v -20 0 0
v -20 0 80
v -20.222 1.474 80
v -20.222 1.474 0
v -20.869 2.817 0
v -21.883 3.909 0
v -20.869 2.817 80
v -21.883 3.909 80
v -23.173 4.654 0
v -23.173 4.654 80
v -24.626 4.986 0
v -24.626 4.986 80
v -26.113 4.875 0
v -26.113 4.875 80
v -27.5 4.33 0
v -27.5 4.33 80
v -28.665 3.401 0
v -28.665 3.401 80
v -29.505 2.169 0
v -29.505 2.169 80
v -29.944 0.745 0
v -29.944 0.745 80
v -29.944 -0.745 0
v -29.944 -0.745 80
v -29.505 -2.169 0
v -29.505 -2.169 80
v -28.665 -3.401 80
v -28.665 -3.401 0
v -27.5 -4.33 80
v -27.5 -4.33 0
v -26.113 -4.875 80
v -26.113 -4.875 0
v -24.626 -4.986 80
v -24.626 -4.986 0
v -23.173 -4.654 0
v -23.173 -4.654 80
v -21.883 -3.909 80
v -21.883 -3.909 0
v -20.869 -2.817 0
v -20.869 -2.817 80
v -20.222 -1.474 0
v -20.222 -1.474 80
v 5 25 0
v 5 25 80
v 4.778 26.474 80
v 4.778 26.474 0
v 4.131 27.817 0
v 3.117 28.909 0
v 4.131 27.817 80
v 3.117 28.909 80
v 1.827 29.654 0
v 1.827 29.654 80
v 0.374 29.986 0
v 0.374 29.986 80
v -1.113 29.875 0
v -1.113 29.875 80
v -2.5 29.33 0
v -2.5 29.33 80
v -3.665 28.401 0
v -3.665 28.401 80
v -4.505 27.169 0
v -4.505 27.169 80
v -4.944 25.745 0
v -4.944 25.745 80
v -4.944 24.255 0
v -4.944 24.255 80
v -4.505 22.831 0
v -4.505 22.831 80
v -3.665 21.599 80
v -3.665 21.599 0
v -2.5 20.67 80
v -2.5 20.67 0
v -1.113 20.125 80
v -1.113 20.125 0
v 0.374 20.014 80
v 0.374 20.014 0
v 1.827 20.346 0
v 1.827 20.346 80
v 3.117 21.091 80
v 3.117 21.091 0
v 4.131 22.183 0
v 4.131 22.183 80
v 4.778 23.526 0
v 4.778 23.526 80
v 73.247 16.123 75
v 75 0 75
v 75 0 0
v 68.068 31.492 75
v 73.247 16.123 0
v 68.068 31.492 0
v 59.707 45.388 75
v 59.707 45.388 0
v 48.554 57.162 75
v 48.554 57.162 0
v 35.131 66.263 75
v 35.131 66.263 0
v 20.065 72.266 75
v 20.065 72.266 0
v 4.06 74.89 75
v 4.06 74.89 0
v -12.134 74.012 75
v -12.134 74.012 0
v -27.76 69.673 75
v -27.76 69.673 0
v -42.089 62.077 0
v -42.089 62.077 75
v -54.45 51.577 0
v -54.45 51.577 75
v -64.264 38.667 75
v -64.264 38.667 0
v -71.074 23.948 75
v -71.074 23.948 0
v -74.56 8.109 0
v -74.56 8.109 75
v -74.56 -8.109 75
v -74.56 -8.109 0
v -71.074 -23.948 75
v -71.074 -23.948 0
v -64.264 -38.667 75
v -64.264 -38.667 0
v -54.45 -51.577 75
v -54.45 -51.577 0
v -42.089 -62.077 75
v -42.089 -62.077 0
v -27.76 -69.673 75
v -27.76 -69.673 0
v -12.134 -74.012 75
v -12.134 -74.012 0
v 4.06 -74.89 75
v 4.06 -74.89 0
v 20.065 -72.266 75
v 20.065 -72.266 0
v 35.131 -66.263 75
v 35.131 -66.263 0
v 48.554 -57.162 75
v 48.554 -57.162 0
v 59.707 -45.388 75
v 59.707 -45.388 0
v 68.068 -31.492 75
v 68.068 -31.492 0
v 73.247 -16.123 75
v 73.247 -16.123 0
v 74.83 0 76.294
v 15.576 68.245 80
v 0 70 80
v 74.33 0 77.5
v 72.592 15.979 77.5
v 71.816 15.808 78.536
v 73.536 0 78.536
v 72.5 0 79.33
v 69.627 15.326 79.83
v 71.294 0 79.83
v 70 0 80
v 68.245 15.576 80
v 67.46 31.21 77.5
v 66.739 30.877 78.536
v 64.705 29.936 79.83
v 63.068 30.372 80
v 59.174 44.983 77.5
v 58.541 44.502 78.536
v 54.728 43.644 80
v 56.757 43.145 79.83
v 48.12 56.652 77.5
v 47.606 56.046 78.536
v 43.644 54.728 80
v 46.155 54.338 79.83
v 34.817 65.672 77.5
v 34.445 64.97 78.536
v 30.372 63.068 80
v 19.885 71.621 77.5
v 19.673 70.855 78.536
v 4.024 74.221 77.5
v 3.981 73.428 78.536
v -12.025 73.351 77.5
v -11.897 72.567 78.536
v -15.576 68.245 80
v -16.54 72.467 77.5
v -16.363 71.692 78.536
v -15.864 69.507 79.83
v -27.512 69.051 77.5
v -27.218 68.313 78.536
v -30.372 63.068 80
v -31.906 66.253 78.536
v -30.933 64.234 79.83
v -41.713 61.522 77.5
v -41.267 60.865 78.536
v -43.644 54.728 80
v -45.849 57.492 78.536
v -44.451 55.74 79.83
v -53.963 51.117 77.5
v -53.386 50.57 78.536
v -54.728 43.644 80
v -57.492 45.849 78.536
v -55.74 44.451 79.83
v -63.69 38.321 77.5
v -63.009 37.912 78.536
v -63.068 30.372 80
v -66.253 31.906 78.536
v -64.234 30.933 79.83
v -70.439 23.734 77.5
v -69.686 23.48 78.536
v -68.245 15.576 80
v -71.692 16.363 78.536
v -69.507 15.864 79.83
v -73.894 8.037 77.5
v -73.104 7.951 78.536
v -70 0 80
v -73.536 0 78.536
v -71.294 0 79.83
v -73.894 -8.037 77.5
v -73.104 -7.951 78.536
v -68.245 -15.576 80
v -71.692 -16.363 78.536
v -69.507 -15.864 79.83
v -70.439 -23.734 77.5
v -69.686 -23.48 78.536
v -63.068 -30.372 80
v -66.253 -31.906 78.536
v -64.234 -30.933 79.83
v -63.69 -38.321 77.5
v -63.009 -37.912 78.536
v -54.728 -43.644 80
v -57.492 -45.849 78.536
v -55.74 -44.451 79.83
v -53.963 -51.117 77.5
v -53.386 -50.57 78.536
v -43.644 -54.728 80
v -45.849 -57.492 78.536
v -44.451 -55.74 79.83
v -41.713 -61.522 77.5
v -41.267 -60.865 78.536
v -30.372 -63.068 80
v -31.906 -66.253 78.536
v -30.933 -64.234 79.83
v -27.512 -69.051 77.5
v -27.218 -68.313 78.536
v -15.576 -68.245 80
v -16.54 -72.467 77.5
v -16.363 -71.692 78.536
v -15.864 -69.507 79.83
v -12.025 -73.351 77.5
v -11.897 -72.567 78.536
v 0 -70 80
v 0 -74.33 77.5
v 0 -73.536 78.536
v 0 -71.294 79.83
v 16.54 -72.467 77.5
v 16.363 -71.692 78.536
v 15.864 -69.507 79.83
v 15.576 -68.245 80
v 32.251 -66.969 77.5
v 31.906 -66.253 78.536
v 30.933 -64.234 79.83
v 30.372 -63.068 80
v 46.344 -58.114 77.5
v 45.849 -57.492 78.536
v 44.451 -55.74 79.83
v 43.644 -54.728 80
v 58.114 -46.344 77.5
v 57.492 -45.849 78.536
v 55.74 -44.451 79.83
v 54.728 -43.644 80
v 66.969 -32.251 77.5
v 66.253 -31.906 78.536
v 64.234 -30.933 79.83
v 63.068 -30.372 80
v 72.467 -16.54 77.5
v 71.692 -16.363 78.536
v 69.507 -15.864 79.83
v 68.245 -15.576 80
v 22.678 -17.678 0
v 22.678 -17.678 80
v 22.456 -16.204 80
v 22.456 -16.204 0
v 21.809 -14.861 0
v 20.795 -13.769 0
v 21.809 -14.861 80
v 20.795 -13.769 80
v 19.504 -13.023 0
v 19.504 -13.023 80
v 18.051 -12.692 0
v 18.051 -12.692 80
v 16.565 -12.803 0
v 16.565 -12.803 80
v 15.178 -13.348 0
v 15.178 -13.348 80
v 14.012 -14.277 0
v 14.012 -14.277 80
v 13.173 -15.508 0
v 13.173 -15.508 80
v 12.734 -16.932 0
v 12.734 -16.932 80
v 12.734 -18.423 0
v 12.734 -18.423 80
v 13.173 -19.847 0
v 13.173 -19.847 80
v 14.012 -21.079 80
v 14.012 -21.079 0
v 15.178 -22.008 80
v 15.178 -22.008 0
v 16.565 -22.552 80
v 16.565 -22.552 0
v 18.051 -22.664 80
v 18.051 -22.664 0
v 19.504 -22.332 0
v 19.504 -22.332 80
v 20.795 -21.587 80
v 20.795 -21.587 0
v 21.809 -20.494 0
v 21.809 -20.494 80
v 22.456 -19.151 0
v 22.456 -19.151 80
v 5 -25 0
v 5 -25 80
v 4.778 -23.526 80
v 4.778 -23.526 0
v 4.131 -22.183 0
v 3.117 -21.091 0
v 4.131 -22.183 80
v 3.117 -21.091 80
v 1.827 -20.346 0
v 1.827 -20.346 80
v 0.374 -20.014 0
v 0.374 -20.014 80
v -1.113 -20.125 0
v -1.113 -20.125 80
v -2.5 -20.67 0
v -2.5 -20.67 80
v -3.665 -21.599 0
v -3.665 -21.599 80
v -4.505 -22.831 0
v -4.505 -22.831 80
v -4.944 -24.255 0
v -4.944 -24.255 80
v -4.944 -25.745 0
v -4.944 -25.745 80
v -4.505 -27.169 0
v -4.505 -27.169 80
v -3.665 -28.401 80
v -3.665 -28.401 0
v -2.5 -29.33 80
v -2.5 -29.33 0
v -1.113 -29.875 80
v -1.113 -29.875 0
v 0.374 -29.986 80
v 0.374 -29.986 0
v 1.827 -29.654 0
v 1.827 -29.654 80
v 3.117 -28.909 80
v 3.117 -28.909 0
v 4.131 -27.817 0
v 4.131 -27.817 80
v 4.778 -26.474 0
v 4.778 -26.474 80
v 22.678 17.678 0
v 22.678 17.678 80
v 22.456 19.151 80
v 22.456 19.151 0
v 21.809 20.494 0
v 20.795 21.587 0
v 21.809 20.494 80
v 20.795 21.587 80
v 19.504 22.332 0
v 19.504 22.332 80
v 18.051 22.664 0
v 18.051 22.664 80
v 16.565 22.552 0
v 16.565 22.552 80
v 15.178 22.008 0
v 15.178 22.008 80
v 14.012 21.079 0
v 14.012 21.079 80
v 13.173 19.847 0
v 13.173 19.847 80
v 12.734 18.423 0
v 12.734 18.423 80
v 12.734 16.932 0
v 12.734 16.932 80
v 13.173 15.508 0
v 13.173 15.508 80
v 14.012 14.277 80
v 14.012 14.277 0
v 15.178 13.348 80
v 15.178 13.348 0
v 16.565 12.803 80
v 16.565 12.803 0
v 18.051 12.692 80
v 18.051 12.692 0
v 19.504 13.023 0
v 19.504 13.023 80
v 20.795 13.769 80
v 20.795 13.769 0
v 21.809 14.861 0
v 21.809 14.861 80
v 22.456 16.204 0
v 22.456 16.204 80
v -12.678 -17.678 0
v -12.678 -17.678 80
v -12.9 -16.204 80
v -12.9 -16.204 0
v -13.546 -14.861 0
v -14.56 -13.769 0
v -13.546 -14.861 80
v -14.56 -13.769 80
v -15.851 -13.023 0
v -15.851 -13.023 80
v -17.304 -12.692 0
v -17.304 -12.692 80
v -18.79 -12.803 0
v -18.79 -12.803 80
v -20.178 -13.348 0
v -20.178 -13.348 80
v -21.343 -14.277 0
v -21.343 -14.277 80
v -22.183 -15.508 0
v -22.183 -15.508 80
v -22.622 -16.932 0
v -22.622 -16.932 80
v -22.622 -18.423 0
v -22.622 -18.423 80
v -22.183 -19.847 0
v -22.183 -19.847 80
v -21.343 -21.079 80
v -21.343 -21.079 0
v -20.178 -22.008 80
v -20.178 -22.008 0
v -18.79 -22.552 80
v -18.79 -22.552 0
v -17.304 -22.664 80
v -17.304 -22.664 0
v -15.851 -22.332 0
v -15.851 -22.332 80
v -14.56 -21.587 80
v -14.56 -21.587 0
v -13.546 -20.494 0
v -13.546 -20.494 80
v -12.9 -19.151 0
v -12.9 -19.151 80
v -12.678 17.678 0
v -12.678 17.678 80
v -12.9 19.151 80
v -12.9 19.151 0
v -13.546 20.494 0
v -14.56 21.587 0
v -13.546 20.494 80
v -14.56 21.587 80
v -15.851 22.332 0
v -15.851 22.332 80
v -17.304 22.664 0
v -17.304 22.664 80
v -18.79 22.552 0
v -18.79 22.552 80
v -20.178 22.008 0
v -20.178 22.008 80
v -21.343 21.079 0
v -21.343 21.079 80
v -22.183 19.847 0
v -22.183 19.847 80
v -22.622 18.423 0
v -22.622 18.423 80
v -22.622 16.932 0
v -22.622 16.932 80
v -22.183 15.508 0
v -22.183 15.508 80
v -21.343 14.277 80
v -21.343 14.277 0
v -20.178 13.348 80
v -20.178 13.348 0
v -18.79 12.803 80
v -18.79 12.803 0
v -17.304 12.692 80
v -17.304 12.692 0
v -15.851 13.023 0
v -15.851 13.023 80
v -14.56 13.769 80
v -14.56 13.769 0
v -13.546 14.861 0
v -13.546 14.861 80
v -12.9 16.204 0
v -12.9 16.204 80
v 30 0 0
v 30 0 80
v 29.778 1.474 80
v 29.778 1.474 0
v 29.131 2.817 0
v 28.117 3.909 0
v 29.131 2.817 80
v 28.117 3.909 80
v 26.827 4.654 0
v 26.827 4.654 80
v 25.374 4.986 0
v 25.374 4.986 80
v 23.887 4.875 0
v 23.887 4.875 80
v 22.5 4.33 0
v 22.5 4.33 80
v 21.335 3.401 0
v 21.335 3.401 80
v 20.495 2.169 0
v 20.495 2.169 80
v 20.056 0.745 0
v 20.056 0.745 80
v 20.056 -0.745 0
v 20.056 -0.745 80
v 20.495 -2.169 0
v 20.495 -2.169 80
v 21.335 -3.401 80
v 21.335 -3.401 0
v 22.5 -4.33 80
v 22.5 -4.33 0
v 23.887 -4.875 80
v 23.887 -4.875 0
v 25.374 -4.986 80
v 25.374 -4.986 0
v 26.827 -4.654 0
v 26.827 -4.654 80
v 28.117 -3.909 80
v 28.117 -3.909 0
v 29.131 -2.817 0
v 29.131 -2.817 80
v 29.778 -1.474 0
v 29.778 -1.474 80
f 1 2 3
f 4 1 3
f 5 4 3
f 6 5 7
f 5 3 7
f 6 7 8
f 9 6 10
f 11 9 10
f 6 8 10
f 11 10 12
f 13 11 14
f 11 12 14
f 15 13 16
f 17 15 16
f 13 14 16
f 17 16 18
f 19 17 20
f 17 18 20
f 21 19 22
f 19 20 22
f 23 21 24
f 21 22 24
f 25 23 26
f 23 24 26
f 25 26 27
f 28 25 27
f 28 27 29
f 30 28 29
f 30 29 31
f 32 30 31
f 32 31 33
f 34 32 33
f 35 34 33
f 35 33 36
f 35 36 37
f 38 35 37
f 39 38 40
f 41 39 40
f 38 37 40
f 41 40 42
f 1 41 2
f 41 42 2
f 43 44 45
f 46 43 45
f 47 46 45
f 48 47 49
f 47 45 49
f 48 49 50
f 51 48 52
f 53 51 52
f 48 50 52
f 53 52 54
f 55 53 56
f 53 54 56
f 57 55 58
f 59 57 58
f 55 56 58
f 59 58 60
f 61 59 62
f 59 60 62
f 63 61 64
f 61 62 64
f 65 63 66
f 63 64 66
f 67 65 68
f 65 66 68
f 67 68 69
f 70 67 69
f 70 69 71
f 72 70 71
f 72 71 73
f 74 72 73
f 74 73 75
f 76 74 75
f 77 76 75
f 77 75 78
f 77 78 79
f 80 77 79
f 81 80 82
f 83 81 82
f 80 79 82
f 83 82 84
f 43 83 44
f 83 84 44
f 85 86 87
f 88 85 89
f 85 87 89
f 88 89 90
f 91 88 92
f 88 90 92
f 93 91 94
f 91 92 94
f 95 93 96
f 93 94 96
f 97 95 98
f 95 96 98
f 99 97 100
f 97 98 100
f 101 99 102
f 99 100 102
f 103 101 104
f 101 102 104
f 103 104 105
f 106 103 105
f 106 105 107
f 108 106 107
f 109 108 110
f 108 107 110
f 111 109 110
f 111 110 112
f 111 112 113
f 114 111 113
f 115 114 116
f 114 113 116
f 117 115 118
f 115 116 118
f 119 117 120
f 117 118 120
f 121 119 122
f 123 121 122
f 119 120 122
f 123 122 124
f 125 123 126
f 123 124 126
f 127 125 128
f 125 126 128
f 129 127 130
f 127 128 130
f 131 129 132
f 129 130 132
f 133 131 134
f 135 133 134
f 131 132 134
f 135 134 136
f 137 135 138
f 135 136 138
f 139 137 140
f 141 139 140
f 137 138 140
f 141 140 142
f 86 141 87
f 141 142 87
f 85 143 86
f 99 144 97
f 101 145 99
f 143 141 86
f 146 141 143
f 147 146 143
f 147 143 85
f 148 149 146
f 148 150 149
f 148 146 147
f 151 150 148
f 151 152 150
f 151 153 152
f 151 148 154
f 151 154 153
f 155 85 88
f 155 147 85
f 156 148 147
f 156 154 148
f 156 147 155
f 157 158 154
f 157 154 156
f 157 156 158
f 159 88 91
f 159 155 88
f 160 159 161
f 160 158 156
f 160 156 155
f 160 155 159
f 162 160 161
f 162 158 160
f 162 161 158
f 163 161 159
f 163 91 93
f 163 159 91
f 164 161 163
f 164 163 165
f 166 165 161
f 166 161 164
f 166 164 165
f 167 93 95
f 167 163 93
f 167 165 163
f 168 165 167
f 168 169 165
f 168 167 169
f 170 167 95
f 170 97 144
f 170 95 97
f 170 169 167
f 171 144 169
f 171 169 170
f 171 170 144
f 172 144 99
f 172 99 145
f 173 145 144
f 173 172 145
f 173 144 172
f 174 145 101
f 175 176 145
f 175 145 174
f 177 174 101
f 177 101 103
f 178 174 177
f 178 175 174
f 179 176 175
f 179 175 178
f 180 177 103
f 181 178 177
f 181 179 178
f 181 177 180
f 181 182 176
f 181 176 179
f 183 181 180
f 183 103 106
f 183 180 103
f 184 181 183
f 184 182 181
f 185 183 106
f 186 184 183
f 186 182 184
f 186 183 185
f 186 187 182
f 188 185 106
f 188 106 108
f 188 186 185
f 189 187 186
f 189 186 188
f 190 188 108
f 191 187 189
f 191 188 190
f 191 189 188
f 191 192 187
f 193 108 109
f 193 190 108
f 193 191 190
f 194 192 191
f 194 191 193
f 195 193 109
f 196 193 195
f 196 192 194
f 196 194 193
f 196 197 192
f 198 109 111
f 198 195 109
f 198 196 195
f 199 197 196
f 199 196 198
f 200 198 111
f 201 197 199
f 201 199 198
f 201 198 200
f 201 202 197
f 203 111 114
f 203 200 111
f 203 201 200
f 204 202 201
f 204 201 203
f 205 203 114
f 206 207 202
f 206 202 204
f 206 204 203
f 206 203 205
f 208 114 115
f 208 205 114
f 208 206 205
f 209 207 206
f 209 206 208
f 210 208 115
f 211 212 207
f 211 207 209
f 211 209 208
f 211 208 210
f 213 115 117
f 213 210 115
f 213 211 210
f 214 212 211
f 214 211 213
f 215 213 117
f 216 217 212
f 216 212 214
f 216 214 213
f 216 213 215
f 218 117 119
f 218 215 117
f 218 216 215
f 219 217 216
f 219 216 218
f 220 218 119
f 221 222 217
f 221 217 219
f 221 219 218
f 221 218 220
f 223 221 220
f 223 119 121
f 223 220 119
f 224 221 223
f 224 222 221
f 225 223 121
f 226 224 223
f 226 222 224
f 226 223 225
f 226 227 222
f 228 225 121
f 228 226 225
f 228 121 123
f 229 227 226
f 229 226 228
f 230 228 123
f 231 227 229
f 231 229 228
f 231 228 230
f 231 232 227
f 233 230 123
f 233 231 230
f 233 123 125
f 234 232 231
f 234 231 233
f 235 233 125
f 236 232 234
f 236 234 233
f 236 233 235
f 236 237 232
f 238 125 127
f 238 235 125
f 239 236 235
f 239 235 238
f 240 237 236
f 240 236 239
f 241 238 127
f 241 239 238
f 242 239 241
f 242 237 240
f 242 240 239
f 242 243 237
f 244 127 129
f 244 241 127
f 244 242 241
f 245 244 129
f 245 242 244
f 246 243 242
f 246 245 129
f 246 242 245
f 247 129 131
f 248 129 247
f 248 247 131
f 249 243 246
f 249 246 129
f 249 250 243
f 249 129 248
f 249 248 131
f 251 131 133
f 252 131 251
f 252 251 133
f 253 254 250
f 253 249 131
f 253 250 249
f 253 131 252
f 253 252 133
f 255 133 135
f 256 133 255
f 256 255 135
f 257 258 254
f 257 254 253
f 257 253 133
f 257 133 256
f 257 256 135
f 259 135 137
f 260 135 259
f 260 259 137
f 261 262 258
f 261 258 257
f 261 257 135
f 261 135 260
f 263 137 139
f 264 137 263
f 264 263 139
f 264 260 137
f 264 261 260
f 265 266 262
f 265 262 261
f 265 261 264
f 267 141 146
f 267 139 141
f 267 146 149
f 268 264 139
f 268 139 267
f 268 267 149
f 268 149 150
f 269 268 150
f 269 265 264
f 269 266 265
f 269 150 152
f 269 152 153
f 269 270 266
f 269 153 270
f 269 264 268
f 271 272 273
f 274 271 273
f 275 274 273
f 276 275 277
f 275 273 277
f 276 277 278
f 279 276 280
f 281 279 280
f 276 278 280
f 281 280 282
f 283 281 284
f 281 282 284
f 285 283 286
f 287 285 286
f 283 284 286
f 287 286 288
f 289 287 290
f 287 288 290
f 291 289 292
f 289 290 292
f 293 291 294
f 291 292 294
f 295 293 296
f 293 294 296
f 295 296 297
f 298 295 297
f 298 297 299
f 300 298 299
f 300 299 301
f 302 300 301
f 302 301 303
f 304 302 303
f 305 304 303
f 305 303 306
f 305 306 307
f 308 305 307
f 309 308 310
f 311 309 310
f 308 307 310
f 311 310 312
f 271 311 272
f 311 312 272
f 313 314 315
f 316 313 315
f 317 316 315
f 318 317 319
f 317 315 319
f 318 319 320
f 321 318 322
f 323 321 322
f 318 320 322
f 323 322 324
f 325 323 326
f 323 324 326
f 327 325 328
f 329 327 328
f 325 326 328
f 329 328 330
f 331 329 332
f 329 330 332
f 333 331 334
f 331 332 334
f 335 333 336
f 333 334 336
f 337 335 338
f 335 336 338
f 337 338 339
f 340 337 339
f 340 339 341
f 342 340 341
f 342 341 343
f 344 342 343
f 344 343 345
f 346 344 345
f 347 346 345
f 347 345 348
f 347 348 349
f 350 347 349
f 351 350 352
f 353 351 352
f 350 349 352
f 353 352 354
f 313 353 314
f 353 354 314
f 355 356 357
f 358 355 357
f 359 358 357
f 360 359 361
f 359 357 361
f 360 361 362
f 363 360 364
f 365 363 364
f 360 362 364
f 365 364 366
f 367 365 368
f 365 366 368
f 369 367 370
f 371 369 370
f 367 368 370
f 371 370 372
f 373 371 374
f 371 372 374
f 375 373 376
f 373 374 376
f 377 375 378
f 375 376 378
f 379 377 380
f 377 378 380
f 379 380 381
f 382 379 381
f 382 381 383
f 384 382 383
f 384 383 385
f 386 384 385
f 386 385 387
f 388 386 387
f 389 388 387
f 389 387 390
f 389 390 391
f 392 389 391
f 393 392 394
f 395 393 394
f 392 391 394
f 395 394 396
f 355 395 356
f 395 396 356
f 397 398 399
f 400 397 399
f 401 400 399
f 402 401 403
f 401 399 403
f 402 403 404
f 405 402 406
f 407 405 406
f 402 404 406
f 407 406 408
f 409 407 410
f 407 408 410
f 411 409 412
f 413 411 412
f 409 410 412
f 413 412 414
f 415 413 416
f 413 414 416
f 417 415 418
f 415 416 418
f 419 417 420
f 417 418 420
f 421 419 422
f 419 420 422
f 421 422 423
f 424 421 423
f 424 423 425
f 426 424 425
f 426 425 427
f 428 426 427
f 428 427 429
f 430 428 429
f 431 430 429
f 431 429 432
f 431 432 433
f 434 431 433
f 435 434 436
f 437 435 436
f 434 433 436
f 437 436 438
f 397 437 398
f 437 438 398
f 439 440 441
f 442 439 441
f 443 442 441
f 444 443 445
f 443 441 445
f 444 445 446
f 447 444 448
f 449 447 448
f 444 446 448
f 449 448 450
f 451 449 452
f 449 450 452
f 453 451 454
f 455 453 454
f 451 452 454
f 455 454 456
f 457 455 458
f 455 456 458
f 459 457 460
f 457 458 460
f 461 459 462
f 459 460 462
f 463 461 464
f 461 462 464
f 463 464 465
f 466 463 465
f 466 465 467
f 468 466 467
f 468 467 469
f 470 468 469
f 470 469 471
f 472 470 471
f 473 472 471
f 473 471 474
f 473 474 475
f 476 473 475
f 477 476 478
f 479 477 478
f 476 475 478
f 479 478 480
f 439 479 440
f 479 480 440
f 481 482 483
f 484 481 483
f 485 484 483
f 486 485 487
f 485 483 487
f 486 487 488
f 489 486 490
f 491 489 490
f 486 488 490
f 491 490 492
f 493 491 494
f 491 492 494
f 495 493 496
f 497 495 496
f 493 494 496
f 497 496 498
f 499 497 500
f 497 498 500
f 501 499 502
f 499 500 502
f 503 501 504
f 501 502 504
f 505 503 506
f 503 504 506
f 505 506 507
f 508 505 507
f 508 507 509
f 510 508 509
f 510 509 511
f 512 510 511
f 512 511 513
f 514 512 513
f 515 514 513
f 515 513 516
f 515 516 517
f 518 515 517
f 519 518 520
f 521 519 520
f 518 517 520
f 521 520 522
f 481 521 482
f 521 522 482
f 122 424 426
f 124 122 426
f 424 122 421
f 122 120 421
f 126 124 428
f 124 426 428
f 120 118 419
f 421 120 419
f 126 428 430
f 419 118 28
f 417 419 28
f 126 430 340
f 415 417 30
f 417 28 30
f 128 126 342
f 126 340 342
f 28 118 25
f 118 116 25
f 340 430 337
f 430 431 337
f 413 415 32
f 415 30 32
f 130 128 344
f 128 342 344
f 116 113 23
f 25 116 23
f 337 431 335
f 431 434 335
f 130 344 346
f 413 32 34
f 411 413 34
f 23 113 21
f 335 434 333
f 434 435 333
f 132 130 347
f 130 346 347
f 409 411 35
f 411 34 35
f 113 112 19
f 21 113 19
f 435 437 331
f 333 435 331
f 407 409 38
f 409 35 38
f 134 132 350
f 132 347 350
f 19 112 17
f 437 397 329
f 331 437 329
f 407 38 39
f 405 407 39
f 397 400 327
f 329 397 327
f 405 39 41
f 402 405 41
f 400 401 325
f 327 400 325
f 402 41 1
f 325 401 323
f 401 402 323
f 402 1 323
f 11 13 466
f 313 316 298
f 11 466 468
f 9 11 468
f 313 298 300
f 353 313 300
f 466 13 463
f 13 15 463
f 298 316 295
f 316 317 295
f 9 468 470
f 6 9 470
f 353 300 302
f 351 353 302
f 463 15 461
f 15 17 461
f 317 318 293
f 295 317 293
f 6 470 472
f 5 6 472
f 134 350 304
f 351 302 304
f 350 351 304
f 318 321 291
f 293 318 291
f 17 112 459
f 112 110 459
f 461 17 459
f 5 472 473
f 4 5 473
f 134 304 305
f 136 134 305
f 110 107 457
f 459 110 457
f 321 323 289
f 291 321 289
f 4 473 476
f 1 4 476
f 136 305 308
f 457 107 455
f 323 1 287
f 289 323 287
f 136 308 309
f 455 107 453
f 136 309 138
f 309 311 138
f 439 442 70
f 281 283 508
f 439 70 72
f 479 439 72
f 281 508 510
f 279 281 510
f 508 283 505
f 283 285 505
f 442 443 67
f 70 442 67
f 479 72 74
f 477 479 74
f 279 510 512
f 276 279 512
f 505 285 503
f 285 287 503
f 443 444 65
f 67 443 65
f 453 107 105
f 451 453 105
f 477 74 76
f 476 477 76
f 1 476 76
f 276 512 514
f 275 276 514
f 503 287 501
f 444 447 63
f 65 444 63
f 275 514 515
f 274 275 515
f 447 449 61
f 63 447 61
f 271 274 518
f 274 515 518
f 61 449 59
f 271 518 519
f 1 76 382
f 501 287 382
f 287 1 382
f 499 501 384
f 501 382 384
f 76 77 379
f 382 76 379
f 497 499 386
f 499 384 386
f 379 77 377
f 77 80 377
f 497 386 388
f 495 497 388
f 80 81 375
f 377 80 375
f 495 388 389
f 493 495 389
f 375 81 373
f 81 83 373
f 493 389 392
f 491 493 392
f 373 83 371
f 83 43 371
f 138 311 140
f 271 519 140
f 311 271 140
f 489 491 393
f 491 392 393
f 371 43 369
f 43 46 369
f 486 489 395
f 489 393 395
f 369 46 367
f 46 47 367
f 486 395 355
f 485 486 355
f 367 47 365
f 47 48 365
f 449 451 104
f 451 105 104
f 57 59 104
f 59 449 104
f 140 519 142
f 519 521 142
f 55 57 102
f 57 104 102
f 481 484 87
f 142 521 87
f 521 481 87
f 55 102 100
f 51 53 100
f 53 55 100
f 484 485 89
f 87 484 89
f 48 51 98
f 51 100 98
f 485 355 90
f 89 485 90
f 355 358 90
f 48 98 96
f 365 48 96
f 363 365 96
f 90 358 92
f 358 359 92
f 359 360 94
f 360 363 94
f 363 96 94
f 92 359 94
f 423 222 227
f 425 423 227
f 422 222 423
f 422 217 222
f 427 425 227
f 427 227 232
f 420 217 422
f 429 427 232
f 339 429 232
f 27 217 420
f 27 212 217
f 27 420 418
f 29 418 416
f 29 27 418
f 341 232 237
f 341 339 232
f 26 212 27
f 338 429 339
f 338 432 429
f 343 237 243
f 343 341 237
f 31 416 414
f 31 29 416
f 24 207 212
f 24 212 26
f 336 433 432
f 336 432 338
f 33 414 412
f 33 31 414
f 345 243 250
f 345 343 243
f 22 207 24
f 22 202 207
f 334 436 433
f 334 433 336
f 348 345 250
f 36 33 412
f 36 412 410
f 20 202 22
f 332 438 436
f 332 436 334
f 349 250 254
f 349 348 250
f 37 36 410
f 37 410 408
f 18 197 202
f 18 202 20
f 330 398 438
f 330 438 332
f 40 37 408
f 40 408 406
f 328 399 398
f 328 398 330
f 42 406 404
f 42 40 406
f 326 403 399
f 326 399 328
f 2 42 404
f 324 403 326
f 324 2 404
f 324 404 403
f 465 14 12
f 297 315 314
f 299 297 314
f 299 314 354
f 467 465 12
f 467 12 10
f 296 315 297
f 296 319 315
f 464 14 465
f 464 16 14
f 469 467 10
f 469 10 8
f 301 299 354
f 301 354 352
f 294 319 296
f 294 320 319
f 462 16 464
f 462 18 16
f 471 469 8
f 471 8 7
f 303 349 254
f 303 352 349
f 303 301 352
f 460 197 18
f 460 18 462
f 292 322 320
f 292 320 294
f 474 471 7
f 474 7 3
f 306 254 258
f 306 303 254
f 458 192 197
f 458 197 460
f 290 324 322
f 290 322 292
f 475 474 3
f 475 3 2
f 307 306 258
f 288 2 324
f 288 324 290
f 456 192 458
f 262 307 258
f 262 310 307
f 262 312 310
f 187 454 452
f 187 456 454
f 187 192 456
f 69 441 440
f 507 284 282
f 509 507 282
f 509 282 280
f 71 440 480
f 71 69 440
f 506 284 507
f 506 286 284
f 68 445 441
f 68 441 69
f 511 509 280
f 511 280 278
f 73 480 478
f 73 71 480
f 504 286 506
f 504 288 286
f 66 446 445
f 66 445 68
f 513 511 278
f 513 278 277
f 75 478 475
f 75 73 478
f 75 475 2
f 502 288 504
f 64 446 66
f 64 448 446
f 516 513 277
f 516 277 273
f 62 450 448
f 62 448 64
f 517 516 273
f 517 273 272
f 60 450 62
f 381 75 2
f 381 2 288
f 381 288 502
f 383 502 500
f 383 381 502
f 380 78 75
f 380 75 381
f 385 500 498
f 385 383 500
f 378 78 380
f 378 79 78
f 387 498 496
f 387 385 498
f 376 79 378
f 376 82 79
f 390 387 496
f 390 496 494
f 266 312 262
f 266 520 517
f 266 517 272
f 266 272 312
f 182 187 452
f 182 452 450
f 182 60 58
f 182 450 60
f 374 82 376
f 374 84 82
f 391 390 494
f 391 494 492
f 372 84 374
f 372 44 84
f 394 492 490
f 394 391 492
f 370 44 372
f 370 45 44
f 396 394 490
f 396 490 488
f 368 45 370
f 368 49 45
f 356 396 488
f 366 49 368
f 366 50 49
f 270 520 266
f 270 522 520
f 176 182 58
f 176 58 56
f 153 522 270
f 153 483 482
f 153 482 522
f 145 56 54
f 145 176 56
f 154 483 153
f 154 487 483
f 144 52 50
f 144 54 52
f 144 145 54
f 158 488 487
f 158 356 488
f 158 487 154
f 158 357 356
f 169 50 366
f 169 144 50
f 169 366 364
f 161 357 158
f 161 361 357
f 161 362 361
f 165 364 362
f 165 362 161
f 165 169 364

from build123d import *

# Parameters (mm, degrees)
F0_R     = 75
F1_DEPTH = 80
F2_R     = 5
F3_R     = 5
F4_DEPTH = 80


with BuildPart() as f1:
    # F0 (on Top) → F1 (new body)
    with BuildSketch(Plane.XY):
        Circle(F0_R)
    extrude(amount=F1_DEPTH)

    # F2
    f2_edges = [f1.edges().sort_by_distance(p)[0] for p in [
        (-75, 0, 80),
    ]]
    fillet(f2_edges, radius=F2_R)

    # F3 (on face) → F4 (cut, through all)
    with BuildSketch(Plane.XY.offset(80)):
        with Locations((-17.67767, 17.67767)):
            Circle(F3_R)
        with Locations((0, 25)):
            Circle(F3_R)
        with Locations((17.67767, 17.67767)):
            Circle(F3_R)
        with Locations((25, 0)):
            Circle(F3_R)
        with Locations((0, -25)):
            Circle(F3_R)
        with Locations((17.67767, -17.67767)):
            Circle(F3_R)
        with Locations((-17.67767, -17.67767)):
            Circle(F3_R)
        with Locations((-25, 0)):
            Circle(F3_R)
    extrude(amount=-F4_DEPTH, mode=Mode.SUBTRACT)


solid = f1.part
